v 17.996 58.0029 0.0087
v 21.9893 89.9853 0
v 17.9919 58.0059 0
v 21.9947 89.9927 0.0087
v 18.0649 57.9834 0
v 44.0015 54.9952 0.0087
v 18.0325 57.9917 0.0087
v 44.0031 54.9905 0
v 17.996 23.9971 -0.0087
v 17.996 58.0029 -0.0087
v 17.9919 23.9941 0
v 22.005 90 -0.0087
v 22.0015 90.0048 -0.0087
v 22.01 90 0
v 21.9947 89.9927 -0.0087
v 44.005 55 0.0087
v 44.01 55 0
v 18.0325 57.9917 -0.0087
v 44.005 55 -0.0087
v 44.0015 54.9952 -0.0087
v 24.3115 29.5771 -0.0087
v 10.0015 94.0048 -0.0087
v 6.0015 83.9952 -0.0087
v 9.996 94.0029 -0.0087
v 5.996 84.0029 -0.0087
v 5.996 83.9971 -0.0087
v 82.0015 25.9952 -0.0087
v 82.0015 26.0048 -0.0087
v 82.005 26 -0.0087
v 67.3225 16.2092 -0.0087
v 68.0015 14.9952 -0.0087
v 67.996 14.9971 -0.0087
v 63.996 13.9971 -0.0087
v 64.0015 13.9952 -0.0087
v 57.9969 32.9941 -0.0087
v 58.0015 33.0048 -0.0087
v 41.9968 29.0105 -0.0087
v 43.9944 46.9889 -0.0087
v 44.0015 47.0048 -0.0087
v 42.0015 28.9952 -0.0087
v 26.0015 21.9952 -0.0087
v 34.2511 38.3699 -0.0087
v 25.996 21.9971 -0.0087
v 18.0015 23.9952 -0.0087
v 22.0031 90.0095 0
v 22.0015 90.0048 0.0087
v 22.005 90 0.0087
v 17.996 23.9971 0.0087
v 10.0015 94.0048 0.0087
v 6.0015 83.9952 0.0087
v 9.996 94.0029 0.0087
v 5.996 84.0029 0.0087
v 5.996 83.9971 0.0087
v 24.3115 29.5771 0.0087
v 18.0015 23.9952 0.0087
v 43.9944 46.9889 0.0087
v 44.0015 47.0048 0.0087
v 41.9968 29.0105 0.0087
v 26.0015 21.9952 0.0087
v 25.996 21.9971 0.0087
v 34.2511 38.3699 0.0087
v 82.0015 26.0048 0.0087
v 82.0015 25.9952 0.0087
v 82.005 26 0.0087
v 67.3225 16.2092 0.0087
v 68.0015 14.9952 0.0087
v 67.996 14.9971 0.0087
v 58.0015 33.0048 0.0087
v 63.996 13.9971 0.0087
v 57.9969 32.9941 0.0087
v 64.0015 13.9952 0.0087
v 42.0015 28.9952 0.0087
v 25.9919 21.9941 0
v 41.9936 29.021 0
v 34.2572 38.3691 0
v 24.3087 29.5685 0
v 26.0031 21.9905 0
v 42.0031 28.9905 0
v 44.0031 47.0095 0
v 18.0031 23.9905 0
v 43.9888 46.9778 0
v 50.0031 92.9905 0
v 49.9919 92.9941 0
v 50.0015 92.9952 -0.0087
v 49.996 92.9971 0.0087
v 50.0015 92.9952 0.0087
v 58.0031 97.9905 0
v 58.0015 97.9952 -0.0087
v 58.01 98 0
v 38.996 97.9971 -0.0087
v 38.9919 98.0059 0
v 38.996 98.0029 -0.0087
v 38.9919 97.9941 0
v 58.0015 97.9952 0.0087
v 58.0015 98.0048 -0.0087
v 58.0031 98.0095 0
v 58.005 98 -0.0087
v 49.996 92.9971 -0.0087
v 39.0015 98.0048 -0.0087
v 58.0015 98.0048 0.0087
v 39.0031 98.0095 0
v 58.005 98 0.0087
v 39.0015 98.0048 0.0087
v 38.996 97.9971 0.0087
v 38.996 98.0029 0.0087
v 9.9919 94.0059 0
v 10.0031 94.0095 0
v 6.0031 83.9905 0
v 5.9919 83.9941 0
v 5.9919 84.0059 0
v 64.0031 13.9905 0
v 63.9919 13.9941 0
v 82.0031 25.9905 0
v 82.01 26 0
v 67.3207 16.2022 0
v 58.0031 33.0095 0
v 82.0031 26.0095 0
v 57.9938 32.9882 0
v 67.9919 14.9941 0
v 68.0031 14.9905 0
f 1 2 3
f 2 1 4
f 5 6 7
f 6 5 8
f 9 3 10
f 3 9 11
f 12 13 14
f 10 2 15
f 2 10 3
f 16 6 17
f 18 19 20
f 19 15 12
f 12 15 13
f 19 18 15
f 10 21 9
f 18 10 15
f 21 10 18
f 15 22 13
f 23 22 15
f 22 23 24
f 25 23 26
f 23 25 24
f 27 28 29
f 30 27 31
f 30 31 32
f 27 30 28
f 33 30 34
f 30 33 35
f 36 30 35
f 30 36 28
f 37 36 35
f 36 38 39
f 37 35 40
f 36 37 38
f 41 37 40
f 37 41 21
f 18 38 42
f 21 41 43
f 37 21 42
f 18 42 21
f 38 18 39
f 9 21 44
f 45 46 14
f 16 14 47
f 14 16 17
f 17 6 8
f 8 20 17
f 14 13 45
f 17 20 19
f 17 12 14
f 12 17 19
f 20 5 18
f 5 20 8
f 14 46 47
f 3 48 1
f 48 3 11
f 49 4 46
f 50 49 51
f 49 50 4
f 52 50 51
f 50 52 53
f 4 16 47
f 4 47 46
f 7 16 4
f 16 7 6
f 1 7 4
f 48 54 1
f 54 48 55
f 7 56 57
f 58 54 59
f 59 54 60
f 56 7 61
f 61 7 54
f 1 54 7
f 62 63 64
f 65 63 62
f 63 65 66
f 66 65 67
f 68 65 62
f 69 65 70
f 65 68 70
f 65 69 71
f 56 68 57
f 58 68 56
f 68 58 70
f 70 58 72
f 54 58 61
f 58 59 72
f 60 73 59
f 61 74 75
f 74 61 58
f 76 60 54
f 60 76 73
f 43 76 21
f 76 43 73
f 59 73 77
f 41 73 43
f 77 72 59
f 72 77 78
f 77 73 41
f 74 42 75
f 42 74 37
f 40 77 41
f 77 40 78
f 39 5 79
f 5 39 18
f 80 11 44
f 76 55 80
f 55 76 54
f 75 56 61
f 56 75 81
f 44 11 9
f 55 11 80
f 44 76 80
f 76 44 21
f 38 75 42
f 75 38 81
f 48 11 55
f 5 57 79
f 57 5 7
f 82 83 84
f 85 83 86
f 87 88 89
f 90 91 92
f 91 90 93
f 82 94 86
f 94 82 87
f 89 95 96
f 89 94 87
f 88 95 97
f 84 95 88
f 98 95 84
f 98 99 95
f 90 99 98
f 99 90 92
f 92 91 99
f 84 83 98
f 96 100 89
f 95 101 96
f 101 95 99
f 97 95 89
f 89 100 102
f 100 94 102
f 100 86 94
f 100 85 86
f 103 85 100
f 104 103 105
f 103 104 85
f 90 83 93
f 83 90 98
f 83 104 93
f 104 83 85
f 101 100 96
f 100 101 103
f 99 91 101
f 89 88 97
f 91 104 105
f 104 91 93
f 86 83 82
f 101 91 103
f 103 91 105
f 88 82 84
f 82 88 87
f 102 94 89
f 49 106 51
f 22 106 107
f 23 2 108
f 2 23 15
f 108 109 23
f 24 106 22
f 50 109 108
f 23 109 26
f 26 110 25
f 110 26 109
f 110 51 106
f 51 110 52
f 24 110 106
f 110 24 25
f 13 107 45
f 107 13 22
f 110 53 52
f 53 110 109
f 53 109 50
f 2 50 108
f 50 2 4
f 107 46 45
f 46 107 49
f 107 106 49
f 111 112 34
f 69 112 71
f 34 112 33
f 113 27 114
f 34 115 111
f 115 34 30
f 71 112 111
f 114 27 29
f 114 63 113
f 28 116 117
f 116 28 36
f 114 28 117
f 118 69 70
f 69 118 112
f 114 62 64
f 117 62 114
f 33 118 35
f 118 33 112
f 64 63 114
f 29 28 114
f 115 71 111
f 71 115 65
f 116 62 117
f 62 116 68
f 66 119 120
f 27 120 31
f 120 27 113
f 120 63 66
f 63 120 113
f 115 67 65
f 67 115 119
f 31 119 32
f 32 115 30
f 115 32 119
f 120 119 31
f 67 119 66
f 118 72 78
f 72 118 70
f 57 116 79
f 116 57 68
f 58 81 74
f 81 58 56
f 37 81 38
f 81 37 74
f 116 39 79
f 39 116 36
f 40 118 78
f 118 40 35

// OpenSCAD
color([0.3519350680925015,0.6477014615427978,0.14125726454845833]) hull(){
    translate([18,58]) sphere(0.01);
    translate([22,90]) sphere(0.01);
    translate([44,55]) sphere(0.01);
}
color([0.23013900541024712,0.8285218163248013,0.9603761550286747]) hull(){
    translate([18,58]) sphere(0.01);
    translate([42,29]) sphere(0.01);
    translate([26,22]) sphere(0.01);
}
color([0.6050710034948523,0.017553655236826726,0.43262871278032167]) hull(){
    translate([18,58]) sphere(0.01);
    translate([18,24]) sphere(0.01);
    translate([44,47]) sphere(0.01);
}
color([0.2571490251669072,0.4480229944680496,0.14517873337393172]) hull(){
    translate([58,98]) sphere(0.01);
    translate([50,93]) sphere(0.01);
    translate([39,98]) sphere(0.01);
}
color([0.8405131005933094,0.9776834869331054,0.10300019528175153]) hull(){
    translate([22,90]) sphere(0.01);
    translate([10,94]) sphere(0.01);
    translate([6,84]) sphere(0.01);
}
color([0.998153073210626,0.8535026464000083,0.6855970549077809]) hull(){
    translate([64,14]) sphere(0.01);
    translate([58,33]) sphere(0.01);
    translate([82,26]) sphere(0.01);
}
color([0.7995005100691247,0.34047238184459006,0.1286635278612125]) hull(){
    translate([68,15]) sphere(0.01);
    translate([58,33]) sphere(0.01);
    translate([82,26]) sphere(0.01);
}
color([0.6020598448119898,0.9167847797194366,0.02081986636819022]) hull(){
    translate([58,33]) sphere(0.01);
    translate([42,29]) sphere(0.01);
    translate([44,47]) sphere(0.01);
}
